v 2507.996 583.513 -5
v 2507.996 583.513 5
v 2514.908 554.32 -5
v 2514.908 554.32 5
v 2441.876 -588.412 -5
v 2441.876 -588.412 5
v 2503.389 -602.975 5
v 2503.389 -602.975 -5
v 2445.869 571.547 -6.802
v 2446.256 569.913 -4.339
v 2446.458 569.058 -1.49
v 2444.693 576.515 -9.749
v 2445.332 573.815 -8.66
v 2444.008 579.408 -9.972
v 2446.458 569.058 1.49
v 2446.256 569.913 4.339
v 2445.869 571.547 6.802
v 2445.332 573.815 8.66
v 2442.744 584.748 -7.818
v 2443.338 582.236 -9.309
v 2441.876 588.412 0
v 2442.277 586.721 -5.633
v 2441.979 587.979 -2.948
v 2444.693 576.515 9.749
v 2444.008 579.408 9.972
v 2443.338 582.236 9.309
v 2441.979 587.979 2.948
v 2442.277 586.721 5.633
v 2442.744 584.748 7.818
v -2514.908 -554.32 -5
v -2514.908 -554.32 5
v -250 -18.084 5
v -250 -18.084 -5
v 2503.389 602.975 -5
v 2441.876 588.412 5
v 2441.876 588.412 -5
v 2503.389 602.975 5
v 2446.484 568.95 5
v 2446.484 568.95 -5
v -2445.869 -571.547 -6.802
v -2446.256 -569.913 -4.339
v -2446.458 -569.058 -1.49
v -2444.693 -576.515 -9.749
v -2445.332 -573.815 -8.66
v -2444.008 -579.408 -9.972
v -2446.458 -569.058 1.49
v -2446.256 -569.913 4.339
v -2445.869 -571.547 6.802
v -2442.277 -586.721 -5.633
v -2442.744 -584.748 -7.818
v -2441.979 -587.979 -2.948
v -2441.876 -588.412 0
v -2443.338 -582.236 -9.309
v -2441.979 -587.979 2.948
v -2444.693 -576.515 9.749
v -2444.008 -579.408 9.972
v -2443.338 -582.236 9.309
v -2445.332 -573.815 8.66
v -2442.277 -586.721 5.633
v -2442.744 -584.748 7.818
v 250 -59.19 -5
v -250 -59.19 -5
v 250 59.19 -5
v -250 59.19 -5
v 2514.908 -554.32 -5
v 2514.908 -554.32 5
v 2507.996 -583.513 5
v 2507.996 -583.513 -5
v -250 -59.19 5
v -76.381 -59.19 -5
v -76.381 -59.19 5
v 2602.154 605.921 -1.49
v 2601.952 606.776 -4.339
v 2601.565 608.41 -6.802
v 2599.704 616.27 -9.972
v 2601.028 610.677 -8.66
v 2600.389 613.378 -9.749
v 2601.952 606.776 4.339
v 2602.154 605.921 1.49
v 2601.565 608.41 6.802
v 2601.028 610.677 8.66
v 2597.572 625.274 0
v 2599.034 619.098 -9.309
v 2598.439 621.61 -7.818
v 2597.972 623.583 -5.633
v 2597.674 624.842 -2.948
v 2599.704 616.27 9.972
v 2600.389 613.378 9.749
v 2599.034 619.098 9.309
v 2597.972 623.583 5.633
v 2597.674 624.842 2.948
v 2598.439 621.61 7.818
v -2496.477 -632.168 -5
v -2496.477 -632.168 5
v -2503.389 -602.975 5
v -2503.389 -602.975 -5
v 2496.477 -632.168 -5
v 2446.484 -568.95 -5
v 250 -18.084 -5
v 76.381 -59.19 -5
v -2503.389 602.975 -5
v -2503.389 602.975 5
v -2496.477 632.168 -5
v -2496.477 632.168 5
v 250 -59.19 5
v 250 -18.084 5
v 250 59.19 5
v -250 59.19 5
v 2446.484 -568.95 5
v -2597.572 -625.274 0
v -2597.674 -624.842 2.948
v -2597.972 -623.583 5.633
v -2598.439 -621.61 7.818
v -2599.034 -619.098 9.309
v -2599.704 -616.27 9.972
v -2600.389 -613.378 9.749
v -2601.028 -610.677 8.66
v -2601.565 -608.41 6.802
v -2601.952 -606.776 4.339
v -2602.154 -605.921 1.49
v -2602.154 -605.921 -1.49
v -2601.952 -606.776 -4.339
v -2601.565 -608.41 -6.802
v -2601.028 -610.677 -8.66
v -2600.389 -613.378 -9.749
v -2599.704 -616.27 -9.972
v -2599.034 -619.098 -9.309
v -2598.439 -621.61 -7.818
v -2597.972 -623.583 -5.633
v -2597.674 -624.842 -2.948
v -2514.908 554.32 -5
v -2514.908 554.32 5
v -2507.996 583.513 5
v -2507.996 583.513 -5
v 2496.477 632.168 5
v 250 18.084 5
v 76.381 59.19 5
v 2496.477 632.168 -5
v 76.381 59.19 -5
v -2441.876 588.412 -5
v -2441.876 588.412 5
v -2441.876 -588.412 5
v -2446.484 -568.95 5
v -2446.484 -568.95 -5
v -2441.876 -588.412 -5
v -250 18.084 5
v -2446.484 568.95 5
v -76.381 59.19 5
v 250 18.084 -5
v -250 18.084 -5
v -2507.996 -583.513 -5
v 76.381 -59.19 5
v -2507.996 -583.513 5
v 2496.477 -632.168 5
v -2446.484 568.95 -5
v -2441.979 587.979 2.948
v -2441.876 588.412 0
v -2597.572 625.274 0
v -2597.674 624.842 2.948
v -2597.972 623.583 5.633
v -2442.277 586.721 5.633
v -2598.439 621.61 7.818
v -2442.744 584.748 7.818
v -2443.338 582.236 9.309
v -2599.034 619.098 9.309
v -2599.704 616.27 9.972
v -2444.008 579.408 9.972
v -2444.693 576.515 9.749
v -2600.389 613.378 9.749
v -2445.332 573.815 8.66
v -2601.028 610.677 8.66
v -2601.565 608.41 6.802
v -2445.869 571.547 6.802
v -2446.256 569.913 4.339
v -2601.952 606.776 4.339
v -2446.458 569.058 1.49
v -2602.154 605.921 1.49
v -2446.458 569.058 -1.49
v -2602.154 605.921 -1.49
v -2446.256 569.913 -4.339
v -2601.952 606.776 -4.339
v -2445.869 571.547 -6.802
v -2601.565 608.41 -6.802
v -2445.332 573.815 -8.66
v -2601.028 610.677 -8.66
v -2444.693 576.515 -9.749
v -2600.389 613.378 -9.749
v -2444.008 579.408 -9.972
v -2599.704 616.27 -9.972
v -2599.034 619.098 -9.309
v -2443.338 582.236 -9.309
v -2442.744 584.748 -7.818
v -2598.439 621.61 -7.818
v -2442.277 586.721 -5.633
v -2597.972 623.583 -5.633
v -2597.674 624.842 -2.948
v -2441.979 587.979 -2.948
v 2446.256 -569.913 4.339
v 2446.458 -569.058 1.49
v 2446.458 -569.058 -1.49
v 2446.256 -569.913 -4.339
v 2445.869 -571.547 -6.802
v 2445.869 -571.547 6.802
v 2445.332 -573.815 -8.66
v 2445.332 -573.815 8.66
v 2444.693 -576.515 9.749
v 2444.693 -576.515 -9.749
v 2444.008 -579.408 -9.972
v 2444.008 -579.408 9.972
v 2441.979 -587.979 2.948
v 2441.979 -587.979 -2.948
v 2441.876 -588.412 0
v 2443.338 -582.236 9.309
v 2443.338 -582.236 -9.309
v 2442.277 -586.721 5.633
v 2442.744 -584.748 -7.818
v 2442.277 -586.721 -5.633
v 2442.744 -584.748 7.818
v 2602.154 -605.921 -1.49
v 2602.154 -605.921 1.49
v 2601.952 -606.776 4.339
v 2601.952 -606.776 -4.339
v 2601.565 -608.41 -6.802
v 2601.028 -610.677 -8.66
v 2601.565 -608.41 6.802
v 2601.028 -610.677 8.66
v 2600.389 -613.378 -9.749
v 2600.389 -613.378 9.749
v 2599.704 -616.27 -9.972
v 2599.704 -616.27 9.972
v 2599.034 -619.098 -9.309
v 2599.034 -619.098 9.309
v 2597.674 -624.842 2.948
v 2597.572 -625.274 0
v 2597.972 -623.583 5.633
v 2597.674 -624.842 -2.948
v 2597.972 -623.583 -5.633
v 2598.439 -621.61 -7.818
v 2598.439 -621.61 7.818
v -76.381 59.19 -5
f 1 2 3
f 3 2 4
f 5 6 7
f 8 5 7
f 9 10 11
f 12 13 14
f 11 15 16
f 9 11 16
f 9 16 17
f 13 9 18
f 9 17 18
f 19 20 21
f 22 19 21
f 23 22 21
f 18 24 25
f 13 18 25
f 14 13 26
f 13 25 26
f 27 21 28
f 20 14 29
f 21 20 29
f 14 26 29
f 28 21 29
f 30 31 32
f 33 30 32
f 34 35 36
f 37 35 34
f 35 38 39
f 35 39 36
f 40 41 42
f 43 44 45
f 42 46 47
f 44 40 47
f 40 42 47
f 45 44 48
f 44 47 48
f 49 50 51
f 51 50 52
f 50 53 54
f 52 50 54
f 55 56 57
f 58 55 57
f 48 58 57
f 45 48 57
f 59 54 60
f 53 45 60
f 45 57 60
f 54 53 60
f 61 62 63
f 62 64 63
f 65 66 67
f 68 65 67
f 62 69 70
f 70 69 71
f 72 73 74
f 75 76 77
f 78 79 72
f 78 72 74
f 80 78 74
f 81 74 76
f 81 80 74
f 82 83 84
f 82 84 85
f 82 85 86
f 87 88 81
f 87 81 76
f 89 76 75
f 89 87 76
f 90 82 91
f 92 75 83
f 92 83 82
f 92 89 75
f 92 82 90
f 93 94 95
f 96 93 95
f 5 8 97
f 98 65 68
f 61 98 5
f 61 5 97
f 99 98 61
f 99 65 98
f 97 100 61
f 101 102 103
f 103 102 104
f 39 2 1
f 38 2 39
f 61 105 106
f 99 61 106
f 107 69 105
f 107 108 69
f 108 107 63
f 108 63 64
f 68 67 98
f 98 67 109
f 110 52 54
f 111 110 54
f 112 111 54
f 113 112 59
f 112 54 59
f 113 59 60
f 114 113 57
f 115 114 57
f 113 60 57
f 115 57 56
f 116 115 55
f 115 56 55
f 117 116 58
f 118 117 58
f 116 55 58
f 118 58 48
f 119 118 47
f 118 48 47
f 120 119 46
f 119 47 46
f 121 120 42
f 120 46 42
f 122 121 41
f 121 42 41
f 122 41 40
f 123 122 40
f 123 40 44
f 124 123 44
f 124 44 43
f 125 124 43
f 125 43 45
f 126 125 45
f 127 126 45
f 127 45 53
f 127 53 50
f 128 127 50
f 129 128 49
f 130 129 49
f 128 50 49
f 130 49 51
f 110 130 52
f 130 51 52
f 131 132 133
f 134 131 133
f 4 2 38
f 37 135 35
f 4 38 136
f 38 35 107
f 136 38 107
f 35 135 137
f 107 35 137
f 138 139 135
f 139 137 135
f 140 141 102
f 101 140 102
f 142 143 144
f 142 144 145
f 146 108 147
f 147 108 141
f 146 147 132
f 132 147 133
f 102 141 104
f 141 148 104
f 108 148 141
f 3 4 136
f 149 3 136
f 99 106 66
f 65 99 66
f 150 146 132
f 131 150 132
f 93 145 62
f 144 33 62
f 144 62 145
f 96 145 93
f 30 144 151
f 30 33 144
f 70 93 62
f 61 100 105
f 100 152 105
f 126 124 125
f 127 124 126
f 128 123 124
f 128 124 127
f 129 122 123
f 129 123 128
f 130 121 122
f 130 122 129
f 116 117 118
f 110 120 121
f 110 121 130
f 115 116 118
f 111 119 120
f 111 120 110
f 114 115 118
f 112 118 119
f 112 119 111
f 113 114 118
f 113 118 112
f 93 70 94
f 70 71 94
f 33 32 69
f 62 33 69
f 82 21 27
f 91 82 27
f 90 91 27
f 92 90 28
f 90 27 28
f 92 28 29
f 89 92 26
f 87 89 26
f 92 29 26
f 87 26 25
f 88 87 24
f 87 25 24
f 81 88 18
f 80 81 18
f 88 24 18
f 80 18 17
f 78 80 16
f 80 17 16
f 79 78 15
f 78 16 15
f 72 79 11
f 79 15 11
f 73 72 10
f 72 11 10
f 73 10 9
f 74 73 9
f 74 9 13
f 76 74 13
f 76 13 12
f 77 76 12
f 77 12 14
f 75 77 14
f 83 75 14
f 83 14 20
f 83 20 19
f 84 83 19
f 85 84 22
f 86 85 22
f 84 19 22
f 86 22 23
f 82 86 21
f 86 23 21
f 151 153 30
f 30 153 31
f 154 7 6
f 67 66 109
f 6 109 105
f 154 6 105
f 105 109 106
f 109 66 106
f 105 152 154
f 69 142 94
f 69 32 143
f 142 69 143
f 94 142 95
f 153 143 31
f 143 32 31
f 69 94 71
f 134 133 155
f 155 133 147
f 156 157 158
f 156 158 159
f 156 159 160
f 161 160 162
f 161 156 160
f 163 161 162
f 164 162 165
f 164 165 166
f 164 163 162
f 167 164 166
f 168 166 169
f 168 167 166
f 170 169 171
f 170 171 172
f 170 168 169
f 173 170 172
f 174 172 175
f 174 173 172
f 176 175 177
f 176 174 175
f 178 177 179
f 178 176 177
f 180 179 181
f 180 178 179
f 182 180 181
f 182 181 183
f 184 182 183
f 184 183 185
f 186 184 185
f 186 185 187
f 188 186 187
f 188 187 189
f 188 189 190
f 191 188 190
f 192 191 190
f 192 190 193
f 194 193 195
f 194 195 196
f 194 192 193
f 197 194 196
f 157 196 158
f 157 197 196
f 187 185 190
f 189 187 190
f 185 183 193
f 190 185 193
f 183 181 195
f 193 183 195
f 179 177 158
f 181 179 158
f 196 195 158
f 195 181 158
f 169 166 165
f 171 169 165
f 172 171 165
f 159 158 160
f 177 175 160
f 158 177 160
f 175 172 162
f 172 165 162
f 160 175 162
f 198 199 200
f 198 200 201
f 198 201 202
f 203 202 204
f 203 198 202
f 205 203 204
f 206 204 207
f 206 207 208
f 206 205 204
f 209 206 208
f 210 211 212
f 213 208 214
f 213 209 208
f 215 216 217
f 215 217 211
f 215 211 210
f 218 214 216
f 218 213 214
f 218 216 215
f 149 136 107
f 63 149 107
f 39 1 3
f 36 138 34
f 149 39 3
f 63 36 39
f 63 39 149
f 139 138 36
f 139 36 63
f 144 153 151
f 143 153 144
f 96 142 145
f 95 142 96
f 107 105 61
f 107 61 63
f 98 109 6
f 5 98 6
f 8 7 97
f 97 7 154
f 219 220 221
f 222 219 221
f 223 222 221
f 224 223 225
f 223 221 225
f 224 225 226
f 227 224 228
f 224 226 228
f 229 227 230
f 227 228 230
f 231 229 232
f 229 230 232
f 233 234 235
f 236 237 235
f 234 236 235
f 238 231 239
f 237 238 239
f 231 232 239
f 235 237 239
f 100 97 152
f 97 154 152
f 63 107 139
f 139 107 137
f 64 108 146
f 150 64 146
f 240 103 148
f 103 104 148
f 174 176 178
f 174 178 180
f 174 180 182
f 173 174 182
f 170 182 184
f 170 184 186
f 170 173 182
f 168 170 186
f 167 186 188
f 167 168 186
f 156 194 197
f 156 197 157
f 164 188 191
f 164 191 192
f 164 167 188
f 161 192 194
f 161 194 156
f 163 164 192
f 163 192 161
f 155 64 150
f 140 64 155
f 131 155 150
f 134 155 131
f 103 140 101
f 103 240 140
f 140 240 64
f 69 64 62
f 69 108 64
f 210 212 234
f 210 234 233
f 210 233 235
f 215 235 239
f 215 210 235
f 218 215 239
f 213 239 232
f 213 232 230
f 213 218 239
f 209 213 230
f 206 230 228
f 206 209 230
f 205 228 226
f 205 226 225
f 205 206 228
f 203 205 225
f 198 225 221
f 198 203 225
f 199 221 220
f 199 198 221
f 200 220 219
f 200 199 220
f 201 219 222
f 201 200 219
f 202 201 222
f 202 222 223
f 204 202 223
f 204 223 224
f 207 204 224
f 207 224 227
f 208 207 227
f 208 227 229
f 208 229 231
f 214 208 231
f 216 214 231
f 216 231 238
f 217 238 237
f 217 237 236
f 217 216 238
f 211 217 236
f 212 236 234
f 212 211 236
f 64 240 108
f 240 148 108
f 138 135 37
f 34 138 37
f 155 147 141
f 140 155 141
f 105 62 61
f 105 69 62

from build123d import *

# Parameters (mm, degrees)
BOSS_EXTRUDE1_DEPTH   = 5
BOSS_EXTRUDE2_DEPTH   = 5
BOSS_EXTRUDE2_2_DEPTH = 5
BOSS_EXTRUDE2_3_DEPTH = 5
BOSS_EXTRUDE2_4_DEPTH = 5
CUT_EXTRUDE1_DEPTH    = 2594.163932788
SKETCH4_R             = 10
BOSS_EXTRUDE4_DEPTH   = 160
MIRROR2_COPY_1_DEPTH  = 2594.163932788


with BuildPart() as part:
    # Sketch1 → Boss-Extrude1 (new, symmetric)
    with BuildSketch(Plane.XY):
        Polygon((-250, 59.189646289), (0, 0), (250, 59.189646289), align=None)
        Polygon((0, 0), (250, -59.189646289), (250, 59.189646289), align=None)
        Polygon((-250, -59.189646289), (250, -59.189646289), (0, 0), align=None)
        Polygon((-250, -59.189646289), (0, 0), (-250, 59.189646289), align=None)
    extrude(amount=BOSS_EXTRUDE1_DEPTH, both=True)


with BuildPart() as body_2:
    # Sketch2 → Boss-Extrude2 (new, symmetric)
    with BuildSketch(Plane.XY):
        Polygon((250, 18.083838862), (250, 59.189646289), (76.380921308, 59.189646289), (2496.47691812, 632.168150433), (2514.908072255, 554.320269555), align=None)
    extrude(amount=BOSS_EXTRUDE2_DEPTH, both=True)

    # Sketch3 → Cut-Extrude1 (cut, symmetric)
    with BuildSketch(Plane.XY.offset(5)):
        Polygon((2602.179840983, 605.811965613), (2446.484079226, 568.949657345), (2441.876290693, 588.411627565), (2597.57205245, 625.273935833), align=None)
    cut_extrude1 = extrude(amount=CUT_EXTRUDE1_DEPTH, both=True, mode=Mode.SUBTRACT)


with BuildPart() as body_3:
    # Sketch2 → Boss-Extrude2 2 (new, symmetric)
    with BuildSketch(Plane.XY):
        Polygon((-2514.908072255, 554.320269555), (-2496.47691812, 632.168150433), (-76.380921308, 59.189646289), (-250, 59.189646289), (-250, 18.083838862), align=None)
    extrude(amount=BOSS_EXTRUDE2_2_DEPTH, both=True)

    # Mirror1: Cut-Extrude1 across plane
    add(cut_extrude1.mirror(Plane(origin=(0, 0, 0), x_dir=(0, 0, 1), z_dir=(1, 0, 0))), mode=Mode.SUBTRACT)


with BuildPart() as body_4:
    # Sketch2 → Boss-Extrude2 3 (new, symmetric)
    with BuildSketch(Plane.XY):
        Polygon((-250, -18.083838862), (-250, -59.189646289), (-76.380921308, -59.189646289), (-2496.47691812, -632.168150433), (-2514.908072255, -554.320269555), align=None)
    extrude(amount=BOSS_EXTRUDE2_3_DEPTH, both=True)

    # Mirror2 copy 1 sketch → Mirror2 copy 1 (cut, symmetric)
    with BuildSketch(Plane(origin=(0, 0, 5), x_dir=(-1, 0, 0), z_dir=(0, 0, 1))):
        Polygon((2602.179840983, 605.811965613), (2446.484079226, 568.949657345), (2441.876290693, 588.411627565), (2597.57205245, 625.273935833), align=None)
    extrude(amount=MIRROR2_COPY_1_DEPTH, both=True, mode=Mode.SUBTRACT)


with BuildPart() as body_5:
    # Sketch2 → Boss-Extrude2 4 (new, symmetric)
    with BuildSketch(Plane.XY):
        Polygon((2514.908072255, -554.320269555), (2496.47691812, -632.168150433), (76.380921308, -59.189646289), (250, -59.189646289), (250, -18.083838862), align=None)
    extrude(amount=BOSS_EXTRUDE2_4_DEPTH, both=True)

    # Mirror2: Cut-Extrude1 across plane
    add(cut_extrude1.mirror(Plane.ZX), mode=Mode.SUBTRACT)


with BuildPart() as body_6:
    # Sketch4 → Boss-Extrude4 (new body)
    with BuildSketch(Plane(origin=(2444.180184959, 578.680642455, 0), x_dir=(0, 0, -1), z_dir=(0.9730985109821265, 0.23038942667659104, 0))):
        with Locations(Location((0, 0, 0), (0, 0, 90))):
            Circle(SKETCH4_R)
    extrude(amount=BOSS_EXTRUDE4_DEPTH)


with BuildPart() as body_7:
    # Mirror3: mirrored copy
    add(body_6.part.mirror(Plane(origin=(0, 0, 0), x_dir=(0, 0, 1), z_dir=(1, 0, 0))))


with BuildPart() as body_8:
    # Mirror4: mirrored copy
    add(body_6.part.mirror(Plane.ZX))


with BuildPart() as body_9:
    # Mirror4 2: mirrored copy
    add(body_7.part.mirror(Plane.ZX))


solid = Compound([part.part, body_2.part, body_3.part, body_4.part, body_5.part, body_6.part, body_7.part, body_8.part, body_9.part])
